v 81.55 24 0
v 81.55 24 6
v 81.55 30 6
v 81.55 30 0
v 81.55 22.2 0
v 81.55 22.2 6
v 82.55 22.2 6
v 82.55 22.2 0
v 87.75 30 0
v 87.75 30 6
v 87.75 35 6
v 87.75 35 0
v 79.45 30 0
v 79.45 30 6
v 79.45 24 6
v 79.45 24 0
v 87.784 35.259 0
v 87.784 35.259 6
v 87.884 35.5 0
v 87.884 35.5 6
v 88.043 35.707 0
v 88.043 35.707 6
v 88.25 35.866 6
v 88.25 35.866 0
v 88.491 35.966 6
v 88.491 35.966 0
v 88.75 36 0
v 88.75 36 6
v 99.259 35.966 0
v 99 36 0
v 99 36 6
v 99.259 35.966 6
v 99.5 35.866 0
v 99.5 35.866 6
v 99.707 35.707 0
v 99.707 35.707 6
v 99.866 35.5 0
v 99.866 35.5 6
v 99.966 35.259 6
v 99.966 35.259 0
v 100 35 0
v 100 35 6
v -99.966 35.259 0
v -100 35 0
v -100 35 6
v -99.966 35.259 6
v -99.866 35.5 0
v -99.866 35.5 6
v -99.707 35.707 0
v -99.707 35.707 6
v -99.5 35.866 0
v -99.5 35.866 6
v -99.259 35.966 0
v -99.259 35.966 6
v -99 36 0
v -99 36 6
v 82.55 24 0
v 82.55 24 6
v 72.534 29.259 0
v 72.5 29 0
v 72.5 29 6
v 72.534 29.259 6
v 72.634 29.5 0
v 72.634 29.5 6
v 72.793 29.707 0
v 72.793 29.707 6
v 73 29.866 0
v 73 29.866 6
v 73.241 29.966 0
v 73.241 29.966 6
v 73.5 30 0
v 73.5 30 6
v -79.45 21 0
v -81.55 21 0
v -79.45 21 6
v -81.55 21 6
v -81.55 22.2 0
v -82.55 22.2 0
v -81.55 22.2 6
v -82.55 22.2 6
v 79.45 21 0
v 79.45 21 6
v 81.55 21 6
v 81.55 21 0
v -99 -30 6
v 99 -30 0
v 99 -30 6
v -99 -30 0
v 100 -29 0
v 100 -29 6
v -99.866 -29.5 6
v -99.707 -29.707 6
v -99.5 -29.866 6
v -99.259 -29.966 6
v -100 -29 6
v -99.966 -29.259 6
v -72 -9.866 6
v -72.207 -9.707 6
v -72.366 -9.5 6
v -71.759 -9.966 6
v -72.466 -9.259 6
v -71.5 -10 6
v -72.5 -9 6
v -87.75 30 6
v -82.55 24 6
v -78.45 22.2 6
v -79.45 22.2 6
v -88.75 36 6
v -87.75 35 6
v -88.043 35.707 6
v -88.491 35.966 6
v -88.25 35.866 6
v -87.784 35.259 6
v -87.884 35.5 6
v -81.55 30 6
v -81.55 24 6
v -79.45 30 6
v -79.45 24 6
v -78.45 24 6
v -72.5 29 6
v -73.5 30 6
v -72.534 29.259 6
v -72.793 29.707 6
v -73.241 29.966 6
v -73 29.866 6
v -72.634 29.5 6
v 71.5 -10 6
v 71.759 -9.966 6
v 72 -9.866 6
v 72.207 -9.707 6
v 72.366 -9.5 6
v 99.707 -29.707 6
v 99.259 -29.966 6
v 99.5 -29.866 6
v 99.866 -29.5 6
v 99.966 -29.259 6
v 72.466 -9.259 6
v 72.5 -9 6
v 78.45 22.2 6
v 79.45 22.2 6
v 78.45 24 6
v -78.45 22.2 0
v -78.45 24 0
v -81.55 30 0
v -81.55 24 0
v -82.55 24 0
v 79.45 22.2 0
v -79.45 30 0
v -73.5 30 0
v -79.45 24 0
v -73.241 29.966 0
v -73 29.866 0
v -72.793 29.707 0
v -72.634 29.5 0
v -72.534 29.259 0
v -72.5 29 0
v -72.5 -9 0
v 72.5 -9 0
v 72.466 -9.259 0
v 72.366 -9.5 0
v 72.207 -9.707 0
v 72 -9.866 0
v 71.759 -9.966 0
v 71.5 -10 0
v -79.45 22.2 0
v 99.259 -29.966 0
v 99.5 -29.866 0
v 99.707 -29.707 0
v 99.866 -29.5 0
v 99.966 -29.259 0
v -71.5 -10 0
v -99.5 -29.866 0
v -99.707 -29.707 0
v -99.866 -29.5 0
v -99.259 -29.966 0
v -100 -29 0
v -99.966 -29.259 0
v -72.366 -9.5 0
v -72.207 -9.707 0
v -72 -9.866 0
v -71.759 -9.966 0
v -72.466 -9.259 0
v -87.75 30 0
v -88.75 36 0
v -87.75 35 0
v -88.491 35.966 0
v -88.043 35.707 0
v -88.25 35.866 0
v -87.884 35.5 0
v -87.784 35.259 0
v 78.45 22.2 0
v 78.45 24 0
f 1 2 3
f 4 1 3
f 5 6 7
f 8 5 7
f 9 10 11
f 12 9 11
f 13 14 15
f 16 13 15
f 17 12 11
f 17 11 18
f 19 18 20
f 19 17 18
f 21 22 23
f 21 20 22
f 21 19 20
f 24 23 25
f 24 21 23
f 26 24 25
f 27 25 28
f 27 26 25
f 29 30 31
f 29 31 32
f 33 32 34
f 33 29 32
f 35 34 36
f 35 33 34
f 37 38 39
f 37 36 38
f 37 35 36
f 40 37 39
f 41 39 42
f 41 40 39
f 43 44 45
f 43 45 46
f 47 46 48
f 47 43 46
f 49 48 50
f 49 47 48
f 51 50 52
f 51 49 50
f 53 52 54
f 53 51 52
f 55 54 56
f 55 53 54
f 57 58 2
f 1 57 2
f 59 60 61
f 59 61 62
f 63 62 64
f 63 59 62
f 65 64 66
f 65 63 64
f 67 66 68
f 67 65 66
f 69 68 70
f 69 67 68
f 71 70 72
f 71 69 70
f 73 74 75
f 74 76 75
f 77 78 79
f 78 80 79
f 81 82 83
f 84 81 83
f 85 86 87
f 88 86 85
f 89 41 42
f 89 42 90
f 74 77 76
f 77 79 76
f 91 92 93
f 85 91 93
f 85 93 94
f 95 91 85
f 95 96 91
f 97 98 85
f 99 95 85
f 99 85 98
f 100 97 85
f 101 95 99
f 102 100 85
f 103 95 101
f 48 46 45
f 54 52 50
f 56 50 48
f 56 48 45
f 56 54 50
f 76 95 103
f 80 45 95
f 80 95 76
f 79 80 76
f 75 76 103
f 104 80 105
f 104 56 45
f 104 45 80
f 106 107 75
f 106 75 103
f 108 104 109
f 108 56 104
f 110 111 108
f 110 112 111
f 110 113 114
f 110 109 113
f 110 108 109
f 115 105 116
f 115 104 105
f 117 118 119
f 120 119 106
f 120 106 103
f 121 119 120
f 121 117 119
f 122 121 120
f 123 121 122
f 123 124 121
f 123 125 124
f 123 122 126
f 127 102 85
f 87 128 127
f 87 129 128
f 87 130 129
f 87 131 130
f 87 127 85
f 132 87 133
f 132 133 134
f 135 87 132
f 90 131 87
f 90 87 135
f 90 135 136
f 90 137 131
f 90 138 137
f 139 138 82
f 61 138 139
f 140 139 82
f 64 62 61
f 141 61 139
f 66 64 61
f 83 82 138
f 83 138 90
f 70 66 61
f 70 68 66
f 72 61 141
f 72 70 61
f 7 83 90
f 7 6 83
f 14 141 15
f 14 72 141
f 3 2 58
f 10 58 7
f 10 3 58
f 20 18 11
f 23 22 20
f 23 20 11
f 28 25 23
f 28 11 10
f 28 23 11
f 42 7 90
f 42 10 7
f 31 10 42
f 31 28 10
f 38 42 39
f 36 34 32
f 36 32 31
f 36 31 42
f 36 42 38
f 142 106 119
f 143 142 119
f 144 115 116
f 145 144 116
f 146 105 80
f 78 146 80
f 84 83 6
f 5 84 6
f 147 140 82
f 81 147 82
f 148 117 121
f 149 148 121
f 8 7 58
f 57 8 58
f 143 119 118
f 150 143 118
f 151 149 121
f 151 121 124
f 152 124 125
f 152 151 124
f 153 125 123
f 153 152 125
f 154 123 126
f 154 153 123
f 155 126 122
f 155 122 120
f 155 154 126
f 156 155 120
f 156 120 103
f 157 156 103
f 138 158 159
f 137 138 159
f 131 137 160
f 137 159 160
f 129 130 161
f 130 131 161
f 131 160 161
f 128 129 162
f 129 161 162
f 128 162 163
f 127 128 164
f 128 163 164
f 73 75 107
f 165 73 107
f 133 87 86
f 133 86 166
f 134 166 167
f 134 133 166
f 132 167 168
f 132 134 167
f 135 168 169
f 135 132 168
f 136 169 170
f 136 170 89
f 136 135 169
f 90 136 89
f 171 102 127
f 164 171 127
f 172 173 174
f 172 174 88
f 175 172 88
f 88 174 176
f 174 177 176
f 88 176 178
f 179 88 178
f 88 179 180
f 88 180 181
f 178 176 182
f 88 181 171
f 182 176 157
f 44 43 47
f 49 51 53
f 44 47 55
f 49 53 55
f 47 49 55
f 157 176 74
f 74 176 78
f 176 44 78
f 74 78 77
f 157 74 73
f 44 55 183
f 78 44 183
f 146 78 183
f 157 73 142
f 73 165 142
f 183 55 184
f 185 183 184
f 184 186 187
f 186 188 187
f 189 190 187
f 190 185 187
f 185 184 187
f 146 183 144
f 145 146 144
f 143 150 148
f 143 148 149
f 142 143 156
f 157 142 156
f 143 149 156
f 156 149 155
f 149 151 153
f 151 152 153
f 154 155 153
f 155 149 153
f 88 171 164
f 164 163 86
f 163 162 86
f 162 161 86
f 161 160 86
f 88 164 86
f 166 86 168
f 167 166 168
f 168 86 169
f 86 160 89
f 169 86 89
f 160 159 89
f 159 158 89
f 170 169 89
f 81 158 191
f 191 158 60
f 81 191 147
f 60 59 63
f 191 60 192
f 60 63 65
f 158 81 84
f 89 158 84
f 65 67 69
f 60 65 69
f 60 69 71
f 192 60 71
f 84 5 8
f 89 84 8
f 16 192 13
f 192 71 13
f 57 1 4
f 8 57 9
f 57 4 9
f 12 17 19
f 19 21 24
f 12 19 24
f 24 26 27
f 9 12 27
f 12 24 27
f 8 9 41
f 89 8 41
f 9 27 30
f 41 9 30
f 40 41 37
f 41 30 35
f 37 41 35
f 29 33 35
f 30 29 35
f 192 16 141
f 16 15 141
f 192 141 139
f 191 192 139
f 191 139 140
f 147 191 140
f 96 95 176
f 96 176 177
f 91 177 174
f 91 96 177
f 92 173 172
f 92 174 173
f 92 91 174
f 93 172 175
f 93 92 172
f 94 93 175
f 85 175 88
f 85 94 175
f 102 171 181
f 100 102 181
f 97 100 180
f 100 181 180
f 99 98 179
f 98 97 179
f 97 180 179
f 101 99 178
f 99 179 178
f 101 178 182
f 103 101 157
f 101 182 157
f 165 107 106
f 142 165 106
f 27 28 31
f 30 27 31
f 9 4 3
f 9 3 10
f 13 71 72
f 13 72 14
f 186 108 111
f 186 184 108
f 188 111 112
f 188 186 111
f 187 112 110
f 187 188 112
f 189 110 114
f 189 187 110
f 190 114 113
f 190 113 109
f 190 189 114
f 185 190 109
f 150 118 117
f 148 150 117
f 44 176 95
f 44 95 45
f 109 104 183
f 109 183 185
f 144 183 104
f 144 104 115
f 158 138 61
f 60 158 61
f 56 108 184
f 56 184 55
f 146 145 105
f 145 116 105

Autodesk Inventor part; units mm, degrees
ref_plane "YZ Plane" through (0, 0, 0) normal (1, 0, 0) x (0, 1, 0)
ref_plane "XZ Plane" through (0, 0, 0) normal (0, 1, 0) x (-1, 0, 0)
ref_plane "XY Plane" through (0, 0, 0) normal (0, 0, 1) x (1, 0, 0)
sketch "Sketch1" plane through (0, 0, 0) normal (0, 0, 1) x (1, 0, 0)
  line L0 (100, -30) -> (-100, -30)
  line L1 (-100, -30) -> (-100, 30)
  line L2 (-100, 30) -> (100, 30)
  line L3 (100, 30) -> (100, -30)
  line L4 (100, -30) -> (-100, 30) construction
  line L5 (-100, -30) -> (100, 30) construction
  point P0 (0, 0)
  dimension "d0" = 200
  dimension "d1" = 60
extrude "Extrusion1" add sketch "Sketch1" along normal blind 6
sketch "Sketch2" plane through (0, 0, 6) normal (0, 0, 1) x (1, 0, 0)
  line L0 (-100, -30) -> (100, -30) projected
  line L1 (100, 30) -> (-100, 30) projected
  line L2 (-72.5, -10) -> (72.5, -10)
  line L3 (72.5, -10) -> (72.5, 30)
  line L4 (72.5, 30) -> (-72.5, 30)
  line L5 (-72.5, 30) -> (-72.5, -10)
  line L6 (-72.5, -10) -> (72.5, 30) construction
  line L7 (72.5, -10) -> (-72.5, 30) construction
  point P0 (0, 0)
  point P1 (0, 10)
  dimension "d4" = 145
  dimension "d5" = 20
extrude "Extrusion2" cut sketch "Sketch2" against normal through all
sketch "Sketch3" plane through (0, 0, 6) normal (0, 0, 1) x (1, 0, 0)
  line L0 (100, 30) -> (72.5, 30) projected
  line L1 (-100, 30) -> (-87.75, 30)
  line L2 (-87.75, 30) -> (-87.75, 36)
  line L3 (-87.75, 36) -> (-100, 36)
  line L4 (-100, 36) -> (-100, 30)
  line L5 (100, 30) -> (87.75, 30)
  line L6 (87.75, 30) -> (87.75, 36)
  line L7 (87.75, 36) -> (100, 36)
  line L8 (100, 36) -> (100, 30)
  point P0 (0, 0)
  dimension "d9" = 6
  dimension "d20" = 12.25
extrude "Extrusion3" add sketch "Sketch3" against normal up to surface (6 mm away)
sketch "Sketch4" plane through (0, 0, 6) normal (0, 0, 1) x (1, 0, 0)
  line L0 (-72.5, 30) -> (-87.75, 30) projected
  line L1 (-81.55, 30) -> (-81.55, 24)
  line L2 (-81.55, 24) -> (-82.55, 24)
  line L3 (-82.55, 24) -> (-82.55, 22.2)
  line L4 (-82.55, 22.2) -> (-81.55, 22.2)
  line L5 (-81.55, 22.2) -> (-81.55, 21)
  line L6 (-81.55, 21) -> (-79.45, 21)
  line L7 (-79.45, 21) -> (-79.45, 22.2)
  line L8 (-79.45, 22.2) -> (-78.45, 22.2)
  line L9 (-78.45, 22.2) -> (-78.45, 24)
  line L10 (-78.45, 24) -> (-79.45, 24)
  line L11 (-79.45, 24) -> (-79.45, 30)
  line L12 (-72.5, -10) -> (-72.5, 30) projected
  line L13 (72.5, -10) -> (-72.5, -10) projected
  line L14 (-80.5, 21) -> (-80.5, 27.2544) construction
  line L15 (-79.45, 30) -> (-81.55, 30)
  point P0 (0, 0)
  point P1 (-80.125, 30)
  dimension "d12" = 2.1
  dimension "d13" = 4.1
  dimension "d15" = 6
  dimension "d16" = 1.8
  dimension "d21" = 8
  dimension "d22" = 9
extrude "Extrusion4" cut sketch "Sketch4" against normal blind 10
mirror "Mirror1" about plane through (0, 0, 0) normal (1, 0, 0) of "Extrusion4"
fillet "Fillet1" radius 1 10 edges at (-100, 36, 3) (-87.75, 36, 3) (-72.5, 30, 3) (72.5, 30, 3) (87.75, 36, 3) (100, 36, 3) (100, -30, 3) (72.5, -10, 3) (-72.5, -10, 3) (-100, -30, 3)
properties part number "InnerFront"
